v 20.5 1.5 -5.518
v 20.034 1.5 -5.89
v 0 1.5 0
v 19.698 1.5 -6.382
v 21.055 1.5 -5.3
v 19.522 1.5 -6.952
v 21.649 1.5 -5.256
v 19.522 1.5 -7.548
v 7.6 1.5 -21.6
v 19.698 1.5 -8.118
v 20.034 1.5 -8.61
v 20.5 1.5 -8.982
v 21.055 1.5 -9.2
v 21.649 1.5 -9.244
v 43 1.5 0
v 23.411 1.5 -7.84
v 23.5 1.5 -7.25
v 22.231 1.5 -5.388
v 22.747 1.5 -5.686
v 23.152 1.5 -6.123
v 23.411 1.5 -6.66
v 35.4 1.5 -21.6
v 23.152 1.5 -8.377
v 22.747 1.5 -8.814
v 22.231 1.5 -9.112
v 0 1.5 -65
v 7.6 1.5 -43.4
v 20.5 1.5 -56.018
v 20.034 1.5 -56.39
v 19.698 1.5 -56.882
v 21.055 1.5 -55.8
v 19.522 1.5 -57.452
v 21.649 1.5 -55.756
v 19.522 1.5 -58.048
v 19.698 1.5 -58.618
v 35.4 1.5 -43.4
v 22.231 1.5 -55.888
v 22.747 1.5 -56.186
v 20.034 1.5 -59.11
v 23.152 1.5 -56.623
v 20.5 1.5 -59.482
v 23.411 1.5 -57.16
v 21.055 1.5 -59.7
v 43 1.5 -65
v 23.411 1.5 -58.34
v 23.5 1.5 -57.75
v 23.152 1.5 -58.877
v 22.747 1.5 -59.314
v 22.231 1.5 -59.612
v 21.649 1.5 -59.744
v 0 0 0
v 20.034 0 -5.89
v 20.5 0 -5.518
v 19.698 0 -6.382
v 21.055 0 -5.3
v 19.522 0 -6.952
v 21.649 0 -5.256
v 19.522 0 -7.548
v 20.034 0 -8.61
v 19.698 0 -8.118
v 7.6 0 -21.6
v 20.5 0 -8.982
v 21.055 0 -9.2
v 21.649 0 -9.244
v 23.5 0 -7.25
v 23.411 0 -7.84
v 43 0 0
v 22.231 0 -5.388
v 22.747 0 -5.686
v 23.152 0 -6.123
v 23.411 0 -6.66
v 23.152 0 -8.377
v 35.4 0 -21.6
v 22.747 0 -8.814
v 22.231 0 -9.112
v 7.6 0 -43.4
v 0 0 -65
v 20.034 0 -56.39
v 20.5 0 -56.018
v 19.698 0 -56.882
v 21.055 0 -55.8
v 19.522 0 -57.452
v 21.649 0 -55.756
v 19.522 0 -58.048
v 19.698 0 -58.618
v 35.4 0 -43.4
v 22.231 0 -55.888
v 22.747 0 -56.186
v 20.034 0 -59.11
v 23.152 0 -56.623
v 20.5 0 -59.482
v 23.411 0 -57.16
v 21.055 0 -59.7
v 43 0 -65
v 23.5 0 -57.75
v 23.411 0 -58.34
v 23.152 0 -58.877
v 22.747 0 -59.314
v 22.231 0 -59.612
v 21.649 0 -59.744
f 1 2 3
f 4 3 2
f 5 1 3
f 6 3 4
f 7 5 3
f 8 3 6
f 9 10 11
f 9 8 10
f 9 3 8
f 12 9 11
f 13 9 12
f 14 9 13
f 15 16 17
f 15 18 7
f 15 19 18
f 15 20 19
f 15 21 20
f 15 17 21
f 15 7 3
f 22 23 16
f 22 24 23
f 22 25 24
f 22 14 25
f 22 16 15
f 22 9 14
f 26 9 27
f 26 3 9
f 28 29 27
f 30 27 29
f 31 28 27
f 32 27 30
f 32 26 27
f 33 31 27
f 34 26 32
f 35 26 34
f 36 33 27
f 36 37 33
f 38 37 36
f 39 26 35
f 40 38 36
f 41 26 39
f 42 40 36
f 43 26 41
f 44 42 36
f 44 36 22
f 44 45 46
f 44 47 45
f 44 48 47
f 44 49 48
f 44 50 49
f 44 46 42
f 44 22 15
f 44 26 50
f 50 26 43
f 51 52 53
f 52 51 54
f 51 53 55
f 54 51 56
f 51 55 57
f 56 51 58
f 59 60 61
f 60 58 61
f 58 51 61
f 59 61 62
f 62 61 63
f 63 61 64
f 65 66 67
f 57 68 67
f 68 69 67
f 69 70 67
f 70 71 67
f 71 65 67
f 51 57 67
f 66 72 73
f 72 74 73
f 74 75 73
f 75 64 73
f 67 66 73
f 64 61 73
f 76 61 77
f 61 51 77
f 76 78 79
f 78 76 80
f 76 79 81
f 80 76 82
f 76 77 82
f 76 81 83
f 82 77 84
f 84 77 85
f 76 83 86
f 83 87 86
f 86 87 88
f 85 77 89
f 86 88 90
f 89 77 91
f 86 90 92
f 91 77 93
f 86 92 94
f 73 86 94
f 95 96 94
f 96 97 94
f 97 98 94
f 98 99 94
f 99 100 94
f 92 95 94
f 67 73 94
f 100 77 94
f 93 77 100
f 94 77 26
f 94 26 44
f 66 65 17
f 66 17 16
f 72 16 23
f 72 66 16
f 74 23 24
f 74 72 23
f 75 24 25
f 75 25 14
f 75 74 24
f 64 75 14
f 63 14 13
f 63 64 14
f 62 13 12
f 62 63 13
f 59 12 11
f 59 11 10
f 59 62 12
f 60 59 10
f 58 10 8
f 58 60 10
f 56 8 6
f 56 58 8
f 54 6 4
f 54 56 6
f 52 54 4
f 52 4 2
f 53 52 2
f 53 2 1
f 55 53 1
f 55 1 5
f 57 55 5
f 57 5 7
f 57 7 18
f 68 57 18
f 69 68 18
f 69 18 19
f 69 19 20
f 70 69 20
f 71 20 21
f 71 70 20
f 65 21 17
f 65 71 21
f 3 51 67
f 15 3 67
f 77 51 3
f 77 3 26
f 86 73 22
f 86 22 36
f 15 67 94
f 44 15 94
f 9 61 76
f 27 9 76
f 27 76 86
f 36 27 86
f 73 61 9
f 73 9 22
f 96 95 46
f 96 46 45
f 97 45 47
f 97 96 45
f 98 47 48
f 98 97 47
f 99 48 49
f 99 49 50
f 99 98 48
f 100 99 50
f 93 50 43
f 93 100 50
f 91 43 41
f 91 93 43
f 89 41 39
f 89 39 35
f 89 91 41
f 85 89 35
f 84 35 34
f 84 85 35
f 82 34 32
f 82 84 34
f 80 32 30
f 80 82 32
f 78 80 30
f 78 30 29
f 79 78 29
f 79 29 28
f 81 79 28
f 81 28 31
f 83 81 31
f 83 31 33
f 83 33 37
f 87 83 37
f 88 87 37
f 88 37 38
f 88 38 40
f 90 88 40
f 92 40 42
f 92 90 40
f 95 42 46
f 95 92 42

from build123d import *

# Parameters (mm, degrees)
SKETCH_1_W      = 43
SKETCH_1_H      = 65
SKETCH_1_R      = 2
SKETCH_1_W_2    = 27.8
SKETCH_1_H_2    = 21.8
EXTRUDE_1_DEPTH = 1.5


with BuildPart() as part:
    # Эскиз1 → Бобышка-Вытянуть1 (new body)
    with BuildSketch(Plane(origin=(0, 0, 0), x_dir=(1, 0, 0), z_dir=(0, 1, 0))):
        with Locations((21.5, 32.5)):
            Rectangle(SKETCH_1_W, SKETCH_1_H)
        with Locations((21.5, 7.25)):
            Circle(SKETCH_1_R, mode=Mode.SUBTRACT)
        with Locations((21.5, 57.75)):
            Circle(SKETCH_1_R, mode=Mode.SUBTRACT)
        with Locations((21.5, 32.5)):
            Rectangle(SKETCH_1_W_2, SKETCH_1_H_2, mode=Mode.SUBTRACT)
    extrude(amount=EXTRUDE_1_DEPTH)


solid = part.part
